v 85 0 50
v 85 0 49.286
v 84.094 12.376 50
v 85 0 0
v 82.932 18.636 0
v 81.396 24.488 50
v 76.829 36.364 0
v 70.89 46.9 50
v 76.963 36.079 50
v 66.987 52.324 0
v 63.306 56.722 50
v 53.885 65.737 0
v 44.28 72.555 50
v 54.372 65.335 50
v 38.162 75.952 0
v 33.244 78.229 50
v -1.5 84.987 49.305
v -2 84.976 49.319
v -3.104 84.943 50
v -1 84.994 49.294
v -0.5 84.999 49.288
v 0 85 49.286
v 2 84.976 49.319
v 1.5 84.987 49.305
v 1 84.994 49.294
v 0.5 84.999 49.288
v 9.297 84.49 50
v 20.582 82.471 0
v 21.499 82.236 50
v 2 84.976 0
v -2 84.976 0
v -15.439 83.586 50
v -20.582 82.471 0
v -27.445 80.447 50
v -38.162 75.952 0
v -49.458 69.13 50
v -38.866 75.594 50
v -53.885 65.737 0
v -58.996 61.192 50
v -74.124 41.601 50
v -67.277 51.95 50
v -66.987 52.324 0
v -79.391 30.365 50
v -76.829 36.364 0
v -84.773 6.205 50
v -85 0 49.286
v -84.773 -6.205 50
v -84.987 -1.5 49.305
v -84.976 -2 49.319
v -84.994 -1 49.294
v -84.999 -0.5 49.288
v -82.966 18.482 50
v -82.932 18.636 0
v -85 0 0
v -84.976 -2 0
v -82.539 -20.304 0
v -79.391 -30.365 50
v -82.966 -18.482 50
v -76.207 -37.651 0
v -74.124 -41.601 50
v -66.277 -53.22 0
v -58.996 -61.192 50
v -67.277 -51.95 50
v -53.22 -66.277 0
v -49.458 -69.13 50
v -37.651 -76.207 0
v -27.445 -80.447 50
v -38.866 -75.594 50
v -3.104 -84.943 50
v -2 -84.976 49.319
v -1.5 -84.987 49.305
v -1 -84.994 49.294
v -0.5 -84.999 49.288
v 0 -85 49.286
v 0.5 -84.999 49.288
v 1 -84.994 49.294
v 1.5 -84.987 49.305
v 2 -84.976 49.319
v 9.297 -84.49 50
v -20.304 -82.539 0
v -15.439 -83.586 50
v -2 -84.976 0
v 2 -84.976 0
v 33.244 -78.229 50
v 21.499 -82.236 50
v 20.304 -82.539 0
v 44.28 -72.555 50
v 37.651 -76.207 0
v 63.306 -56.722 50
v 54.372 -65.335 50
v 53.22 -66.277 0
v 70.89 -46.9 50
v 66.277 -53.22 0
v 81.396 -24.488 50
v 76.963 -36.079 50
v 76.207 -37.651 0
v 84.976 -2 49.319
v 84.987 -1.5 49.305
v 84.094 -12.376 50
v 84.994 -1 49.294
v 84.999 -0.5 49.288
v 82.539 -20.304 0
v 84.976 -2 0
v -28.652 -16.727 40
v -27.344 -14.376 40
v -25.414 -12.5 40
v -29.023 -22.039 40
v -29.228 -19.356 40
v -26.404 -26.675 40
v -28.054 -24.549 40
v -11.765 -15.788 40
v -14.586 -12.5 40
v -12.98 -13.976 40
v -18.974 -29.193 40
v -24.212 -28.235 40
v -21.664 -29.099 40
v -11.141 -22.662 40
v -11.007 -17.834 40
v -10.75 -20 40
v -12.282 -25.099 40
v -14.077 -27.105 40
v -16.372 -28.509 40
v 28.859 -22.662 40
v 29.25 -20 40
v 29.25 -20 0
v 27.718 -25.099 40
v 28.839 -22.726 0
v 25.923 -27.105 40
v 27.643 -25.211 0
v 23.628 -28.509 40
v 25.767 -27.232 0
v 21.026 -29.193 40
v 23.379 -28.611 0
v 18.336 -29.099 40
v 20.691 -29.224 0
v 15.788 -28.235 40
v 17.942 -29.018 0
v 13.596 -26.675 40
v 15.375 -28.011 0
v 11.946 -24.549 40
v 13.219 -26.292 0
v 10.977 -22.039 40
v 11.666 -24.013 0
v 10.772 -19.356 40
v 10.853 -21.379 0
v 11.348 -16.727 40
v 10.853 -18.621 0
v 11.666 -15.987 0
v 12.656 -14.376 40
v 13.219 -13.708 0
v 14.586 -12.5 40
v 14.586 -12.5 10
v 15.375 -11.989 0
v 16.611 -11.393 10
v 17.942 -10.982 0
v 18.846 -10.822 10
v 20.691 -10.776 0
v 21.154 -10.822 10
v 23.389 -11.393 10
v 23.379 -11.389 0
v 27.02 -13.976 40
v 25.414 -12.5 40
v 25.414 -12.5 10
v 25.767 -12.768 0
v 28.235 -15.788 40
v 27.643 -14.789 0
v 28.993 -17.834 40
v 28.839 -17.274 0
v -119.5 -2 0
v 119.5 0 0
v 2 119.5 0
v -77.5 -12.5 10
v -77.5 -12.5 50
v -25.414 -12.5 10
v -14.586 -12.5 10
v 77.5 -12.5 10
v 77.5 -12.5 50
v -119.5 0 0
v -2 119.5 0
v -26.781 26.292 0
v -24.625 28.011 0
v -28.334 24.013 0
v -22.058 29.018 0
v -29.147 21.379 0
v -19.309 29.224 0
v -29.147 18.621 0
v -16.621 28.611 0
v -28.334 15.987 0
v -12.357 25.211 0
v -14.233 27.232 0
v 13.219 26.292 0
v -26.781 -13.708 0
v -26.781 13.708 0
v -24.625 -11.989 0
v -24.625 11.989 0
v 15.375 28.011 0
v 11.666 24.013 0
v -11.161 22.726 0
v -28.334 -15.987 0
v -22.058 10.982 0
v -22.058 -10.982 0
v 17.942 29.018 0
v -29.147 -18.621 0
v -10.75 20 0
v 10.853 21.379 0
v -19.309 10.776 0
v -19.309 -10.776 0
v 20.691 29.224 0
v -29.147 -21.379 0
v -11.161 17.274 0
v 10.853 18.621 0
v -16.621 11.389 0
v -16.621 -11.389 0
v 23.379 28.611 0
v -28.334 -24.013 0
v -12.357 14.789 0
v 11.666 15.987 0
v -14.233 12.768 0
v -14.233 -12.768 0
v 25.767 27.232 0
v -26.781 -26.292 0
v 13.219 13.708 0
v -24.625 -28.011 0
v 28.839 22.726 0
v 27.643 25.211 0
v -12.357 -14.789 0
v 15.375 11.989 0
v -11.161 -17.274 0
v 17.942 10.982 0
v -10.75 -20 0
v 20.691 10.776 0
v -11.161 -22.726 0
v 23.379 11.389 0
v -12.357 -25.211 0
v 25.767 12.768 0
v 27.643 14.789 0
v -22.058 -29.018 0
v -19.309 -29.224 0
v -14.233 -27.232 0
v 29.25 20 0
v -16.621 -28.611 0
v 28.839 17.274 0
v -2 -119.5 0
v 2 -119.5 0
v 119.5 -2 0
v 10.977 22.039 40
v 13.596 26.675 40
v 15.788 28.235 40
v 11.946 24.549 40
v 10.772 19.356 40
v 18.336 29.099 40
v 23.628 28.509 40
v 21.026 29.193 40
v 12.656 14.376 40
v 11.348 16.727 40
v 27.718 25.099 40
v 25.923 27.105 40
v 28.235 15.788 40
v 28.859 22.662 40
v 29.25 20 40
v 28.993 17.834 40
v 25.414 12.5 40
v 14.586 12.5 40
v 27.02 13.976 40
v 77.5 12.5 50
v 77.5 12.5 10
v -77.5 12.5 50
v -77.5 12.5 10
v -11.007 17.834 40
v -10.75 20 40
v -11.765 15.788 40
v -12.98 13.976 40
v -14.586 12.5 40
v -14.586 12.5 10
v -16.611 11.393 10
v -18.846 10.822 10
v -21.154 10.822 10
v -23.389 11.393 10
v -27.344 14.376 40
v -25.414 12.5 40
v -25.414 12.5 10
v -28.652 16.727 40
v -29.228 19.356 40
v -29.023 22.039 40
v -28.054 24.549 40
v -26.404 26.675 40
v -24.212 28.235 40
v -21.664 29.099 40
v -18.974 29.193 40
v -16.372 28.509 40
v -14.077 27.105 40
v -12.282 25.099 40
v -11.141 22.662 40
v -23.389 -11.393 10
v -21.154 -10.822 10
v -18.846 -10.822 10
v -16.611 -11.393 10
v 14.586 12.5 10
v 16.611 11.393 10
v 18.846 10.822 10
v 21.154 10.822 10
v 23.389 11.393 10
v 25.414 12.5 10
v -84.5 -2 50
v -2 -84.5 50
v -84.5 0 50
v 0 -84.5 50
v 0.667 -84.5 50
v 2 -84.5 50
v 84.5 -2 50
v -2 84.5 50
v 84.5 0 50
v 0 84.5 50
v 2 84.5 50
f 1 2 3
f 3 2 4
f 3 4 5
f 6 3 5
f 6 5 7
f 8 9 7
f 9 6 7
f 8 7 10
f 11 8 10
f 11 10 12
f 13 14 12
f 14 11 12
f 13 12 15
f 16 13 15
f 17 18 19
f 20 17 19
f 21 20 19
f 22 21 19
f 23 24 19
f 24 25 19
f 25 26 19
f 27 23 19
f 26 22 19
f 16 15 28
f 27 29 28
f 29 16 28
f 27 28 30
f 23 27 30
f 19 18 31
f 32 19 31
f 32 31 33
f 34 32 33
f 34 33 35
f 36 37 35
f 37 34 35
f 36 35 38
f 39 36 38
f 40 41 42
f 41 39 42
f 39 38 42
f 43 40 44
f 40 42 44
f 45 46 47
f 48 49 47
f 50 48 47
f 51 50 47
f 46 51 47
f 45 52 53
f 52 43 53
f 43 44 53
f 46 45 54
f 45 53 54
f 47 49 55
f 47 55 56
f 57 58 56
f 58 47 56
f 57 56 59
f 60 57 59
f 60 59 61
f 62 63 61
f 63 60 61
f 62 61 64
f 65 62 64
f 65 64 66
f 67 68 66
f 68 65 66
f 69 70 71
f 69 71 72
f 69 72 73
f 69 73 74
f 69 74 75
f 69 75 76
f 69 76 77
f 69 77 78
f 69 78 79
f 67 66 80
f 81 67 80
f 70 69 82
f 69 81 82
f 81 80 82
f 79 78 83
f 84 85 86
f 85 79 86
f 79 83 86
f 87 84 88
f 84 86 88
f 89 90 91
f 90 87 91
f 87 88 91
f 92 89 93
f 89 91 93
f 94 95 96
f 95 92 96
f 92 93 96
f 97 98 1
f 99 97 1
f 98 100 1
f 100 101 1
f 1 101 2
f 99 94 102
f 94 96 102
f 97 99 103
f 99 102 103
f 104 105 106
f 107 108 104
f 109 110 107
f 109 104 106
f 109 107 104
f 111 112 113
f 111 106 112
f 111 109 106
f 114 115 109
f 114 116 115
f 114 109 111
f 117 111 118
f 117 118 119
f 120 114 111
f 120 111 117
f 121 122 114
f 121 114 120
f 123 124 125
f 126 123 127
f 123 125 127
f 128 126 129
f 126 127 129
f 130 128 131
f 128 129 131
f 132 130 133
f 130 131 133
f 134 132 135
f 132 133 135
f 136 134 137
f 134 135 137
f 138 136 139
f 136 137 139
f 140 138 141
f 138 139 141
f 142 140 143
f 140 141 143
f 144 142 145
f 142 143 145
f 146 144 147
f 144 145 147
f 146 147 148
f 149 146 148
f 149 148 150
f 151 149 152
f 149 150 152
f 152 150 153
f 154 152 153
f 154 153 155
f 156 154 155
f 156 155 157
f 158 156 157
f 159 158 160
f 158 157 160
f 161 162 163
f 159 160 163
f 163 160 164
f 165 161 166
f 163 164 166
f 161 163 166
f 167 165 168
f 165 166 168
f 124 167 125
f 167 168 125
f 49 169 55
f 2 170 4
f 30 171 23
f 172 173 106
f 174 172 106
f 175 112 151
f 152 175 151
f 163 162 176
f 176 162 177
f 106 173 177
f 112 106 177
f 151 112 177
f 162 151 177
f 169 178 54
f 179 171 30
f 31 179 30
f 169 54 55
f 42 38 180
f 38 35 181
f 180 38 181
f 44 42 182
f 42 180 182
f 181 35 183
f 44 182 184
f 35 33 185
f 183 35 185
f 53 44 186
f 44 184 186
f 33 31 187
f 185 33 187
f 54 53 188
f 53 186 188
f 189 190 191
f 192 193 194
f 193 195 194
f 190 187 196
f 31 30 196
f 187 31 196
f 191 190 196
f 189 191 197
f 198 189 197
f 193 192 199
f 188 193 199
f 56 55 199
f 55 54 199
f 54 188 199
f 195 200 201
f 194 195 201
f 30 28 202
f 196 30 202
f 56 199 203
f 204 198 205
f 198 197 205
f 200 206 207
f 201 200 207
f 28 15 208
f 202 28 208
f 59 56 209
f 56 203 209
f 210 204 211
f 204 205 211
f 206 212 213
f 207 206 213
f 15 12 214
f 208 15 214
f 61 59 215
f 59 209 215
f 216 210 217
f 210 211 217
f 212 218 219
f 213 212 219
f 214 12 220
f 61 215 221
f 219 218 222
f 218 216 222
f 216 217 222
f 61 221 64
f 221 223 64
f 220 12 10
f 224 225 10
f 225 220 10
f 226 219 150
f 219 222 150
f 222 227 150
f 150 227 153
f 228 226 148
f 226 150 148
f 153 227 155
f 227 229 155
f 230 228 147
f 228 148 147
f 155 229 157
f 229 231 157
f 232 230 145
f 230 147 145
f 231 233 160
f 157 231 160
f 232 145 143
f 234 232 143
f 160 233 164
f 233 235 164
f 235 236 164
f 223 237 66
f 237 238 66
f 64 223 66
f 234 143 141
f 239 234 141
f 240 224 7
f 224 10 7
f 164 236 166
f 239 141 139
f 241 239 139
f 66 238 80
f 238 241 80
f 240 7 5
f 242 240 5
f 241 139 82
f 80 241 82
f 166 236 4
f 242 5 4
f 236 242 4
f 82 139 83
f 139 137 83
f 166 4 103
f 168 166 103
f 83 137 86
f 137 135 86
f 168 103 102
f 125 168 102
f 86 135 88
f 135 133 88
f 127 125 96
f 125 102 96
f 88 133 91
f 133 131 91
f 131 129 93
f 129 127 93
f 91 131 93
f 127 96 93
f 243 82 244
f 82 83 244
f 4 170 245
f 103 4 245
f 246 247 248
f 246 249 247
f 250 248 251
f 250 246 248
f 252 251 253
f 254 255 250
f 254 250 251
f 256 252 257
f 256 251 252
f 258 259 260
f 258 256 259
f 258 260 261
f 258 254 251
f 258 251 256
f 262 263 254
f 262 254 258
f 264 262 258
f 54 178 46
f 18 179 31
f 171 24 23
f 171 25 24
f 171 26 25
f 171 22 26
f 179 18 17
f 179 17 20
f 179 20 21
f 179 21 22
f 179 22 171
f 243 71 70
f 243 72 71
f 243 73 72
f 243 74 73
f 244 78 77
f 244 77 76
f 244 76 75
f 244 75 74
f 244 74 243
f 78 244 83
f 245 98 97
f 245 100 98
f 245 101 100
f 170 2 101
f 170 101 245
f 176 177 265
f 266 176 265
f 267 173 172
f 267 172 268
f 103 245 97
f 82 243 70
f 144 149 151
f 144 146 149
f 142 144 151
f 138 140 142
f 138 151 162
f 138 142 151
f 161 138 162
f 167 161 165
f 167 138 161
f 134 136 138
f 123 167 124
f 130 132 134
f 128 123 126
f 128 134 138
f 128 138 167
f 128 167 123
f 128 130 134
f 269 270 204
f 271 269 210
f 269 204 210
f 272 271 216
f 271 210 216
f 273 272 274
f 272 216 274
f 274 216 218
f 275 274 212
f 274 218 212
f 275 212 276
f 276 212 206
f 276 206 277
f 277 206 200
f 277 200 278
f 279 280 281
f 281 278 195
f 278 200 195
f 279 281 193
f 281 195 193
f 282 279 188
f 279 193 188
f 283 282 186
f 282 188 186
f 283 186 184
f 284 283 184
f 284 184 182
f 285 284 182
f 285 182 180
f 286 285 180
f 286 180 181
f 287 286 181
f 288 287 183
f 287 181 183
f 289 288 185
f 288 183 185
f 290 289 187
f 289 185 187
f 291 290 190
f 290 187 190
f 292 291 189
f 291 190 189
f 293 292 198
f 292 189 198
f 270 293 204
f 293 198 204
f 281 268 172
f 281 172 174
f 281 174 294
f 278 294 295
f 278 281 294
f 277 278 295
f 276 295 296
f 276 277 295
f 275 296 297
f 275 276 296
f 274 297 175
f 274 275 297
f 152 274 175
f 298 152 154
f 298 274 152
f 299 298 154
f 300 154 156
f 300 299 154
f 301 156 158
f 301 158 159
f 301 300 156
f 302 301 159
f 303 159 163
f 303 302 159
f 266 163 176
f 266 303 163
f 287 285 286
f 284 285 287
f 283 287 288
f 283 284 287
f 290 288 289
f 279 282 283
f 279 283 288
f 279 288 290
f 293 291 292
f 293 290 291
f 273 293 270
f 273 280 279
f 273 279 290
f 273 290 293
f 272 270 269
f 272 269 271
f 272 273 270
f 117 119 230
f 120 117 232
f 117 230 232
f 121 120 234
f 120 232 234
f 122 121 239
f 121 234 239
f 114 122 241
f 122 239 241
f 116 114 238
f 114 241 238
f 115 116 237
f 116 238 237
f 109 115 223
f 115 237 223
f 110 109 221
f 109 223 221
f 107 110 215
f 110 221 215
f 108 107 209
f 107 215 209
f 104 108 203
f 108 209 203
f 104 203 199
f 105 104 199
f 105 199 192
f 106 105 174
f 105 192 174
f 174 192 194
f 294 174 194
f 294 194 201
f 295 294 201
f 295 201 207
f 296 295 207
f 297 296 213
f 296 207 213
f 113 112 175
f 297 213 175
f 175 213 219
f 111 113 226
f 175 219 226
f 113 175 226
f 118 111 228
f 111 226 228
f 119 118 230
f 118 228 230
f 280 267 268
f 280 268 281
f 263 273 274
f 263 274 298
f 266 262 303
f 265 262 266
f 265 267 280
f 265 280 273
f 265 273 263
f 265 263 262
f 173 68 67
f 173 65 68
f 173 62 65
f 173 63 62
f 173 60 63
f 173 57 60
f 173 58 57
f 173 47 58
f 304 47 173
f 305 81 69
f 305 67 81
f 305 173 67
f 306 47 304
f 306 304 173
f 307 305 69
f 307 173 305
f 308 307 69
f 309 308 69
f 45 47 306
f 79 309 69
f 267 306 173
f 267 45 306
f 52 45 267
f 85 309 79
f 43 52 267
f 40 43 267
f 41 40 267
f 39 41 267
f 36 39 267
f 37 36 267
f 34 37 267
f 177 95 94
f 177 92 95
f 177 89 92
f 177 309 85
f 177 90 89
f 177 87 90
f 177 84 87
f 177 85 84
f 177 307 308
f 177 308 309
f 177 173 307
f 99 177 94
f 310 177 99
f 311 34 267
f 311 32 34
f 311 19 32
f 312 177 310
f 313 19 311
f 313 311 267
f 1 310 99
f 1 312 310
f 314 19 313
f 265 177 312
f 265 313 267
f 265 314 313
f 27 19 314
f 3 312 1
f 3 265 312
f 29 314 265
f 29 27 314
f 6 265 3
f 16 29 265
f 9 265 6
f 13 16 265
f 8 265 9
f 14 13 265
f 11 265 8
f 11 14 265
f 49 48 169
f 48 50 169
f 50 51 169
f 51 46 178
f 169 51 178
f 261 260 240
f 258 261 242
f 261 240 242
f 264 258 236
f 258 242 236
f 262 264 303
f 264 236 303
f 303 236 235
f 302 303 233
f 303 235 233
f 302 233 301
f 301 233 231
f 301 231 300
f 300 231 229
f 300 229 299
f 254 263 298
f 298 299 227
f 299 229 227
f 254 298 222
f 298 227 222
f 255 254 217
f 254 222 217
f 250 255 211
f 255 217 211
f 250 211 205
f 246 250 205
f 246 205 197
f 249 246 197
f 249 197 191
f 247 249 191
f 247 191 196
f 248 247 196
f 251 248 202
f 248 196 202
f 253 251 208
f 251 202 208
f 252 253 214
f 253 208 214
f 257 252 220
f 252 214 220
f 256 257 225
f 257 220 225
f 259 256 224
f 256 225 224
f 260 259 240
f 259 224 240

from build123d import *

# Parameters (mm, degrees)
F0_R      = 85
F1_DEPTH  = 50
F2_R      = 9.25
F3_DEPTH  = 40
F4_W      = 155
F4_H      = 25
F5_DEPTH  = 40
F7_DEPTH  = 2
F10_DEPTH = 2


with BuildPart() as f1:
    # F0 (on Top) → F1 (new body)
    with BuildSketch(Plane.XY):
        Circle(F0_R)
    extrude(amount=F1_DEPTH)

    # F2 (on face) → F3 (cut)
    with BuildSketch(Plane(origin=(0, 0, 0), x_dir=(1, 0, 0), z_dir=(0, 0, -1))):
        with Locations((20, 20)):
            Circle(F2_R)
        with Locations((-20, 20)):
            Circle(F2_R)
        with Locations((-20, -20)):
            Circle(F2_R)
        with Locations((20, -20)):
            Circle(F2_R)
    extrude(amount=-F3_DEPTH, mode=Mode.SUBTRACT)

    # F4 (on face) → F5 (cut)
    with BuildSketch(Plane.XY.offset(50)):
        Rectangle(F4_W, F4_H)
    extrude(amount=-F5_DEPTH, mode=Mode.SUBTRACT)

    # F6 (on Right) → F7 (join)
    with BuildSketch(Plane.YZ):
        Polygon((-119.5, 0), (-84.5, 0), (-84.5, 50), align=None)
    extrude(amount=F7_DEPTH)

    # F8: F1 across plane


with BuildPart() as f1_1:
    add(f1.part)
    add(f1.part.mirror(Plane.XZ))

    # F9 (on Front) → F10 (join)
    with BuildSketch(Plane.XZ):
        Polygon((-84.5, 0), (-84.5, 50), (-119.5, 0), align=None)
    extrude(amount=F10_DEPTH)

    # F11: F1 across plane


with BuildPart() as f1_2:
    add(f1_1.part)
    add(f1_1.part.mirror(Plane.YZ))


solid = f1_2.part
